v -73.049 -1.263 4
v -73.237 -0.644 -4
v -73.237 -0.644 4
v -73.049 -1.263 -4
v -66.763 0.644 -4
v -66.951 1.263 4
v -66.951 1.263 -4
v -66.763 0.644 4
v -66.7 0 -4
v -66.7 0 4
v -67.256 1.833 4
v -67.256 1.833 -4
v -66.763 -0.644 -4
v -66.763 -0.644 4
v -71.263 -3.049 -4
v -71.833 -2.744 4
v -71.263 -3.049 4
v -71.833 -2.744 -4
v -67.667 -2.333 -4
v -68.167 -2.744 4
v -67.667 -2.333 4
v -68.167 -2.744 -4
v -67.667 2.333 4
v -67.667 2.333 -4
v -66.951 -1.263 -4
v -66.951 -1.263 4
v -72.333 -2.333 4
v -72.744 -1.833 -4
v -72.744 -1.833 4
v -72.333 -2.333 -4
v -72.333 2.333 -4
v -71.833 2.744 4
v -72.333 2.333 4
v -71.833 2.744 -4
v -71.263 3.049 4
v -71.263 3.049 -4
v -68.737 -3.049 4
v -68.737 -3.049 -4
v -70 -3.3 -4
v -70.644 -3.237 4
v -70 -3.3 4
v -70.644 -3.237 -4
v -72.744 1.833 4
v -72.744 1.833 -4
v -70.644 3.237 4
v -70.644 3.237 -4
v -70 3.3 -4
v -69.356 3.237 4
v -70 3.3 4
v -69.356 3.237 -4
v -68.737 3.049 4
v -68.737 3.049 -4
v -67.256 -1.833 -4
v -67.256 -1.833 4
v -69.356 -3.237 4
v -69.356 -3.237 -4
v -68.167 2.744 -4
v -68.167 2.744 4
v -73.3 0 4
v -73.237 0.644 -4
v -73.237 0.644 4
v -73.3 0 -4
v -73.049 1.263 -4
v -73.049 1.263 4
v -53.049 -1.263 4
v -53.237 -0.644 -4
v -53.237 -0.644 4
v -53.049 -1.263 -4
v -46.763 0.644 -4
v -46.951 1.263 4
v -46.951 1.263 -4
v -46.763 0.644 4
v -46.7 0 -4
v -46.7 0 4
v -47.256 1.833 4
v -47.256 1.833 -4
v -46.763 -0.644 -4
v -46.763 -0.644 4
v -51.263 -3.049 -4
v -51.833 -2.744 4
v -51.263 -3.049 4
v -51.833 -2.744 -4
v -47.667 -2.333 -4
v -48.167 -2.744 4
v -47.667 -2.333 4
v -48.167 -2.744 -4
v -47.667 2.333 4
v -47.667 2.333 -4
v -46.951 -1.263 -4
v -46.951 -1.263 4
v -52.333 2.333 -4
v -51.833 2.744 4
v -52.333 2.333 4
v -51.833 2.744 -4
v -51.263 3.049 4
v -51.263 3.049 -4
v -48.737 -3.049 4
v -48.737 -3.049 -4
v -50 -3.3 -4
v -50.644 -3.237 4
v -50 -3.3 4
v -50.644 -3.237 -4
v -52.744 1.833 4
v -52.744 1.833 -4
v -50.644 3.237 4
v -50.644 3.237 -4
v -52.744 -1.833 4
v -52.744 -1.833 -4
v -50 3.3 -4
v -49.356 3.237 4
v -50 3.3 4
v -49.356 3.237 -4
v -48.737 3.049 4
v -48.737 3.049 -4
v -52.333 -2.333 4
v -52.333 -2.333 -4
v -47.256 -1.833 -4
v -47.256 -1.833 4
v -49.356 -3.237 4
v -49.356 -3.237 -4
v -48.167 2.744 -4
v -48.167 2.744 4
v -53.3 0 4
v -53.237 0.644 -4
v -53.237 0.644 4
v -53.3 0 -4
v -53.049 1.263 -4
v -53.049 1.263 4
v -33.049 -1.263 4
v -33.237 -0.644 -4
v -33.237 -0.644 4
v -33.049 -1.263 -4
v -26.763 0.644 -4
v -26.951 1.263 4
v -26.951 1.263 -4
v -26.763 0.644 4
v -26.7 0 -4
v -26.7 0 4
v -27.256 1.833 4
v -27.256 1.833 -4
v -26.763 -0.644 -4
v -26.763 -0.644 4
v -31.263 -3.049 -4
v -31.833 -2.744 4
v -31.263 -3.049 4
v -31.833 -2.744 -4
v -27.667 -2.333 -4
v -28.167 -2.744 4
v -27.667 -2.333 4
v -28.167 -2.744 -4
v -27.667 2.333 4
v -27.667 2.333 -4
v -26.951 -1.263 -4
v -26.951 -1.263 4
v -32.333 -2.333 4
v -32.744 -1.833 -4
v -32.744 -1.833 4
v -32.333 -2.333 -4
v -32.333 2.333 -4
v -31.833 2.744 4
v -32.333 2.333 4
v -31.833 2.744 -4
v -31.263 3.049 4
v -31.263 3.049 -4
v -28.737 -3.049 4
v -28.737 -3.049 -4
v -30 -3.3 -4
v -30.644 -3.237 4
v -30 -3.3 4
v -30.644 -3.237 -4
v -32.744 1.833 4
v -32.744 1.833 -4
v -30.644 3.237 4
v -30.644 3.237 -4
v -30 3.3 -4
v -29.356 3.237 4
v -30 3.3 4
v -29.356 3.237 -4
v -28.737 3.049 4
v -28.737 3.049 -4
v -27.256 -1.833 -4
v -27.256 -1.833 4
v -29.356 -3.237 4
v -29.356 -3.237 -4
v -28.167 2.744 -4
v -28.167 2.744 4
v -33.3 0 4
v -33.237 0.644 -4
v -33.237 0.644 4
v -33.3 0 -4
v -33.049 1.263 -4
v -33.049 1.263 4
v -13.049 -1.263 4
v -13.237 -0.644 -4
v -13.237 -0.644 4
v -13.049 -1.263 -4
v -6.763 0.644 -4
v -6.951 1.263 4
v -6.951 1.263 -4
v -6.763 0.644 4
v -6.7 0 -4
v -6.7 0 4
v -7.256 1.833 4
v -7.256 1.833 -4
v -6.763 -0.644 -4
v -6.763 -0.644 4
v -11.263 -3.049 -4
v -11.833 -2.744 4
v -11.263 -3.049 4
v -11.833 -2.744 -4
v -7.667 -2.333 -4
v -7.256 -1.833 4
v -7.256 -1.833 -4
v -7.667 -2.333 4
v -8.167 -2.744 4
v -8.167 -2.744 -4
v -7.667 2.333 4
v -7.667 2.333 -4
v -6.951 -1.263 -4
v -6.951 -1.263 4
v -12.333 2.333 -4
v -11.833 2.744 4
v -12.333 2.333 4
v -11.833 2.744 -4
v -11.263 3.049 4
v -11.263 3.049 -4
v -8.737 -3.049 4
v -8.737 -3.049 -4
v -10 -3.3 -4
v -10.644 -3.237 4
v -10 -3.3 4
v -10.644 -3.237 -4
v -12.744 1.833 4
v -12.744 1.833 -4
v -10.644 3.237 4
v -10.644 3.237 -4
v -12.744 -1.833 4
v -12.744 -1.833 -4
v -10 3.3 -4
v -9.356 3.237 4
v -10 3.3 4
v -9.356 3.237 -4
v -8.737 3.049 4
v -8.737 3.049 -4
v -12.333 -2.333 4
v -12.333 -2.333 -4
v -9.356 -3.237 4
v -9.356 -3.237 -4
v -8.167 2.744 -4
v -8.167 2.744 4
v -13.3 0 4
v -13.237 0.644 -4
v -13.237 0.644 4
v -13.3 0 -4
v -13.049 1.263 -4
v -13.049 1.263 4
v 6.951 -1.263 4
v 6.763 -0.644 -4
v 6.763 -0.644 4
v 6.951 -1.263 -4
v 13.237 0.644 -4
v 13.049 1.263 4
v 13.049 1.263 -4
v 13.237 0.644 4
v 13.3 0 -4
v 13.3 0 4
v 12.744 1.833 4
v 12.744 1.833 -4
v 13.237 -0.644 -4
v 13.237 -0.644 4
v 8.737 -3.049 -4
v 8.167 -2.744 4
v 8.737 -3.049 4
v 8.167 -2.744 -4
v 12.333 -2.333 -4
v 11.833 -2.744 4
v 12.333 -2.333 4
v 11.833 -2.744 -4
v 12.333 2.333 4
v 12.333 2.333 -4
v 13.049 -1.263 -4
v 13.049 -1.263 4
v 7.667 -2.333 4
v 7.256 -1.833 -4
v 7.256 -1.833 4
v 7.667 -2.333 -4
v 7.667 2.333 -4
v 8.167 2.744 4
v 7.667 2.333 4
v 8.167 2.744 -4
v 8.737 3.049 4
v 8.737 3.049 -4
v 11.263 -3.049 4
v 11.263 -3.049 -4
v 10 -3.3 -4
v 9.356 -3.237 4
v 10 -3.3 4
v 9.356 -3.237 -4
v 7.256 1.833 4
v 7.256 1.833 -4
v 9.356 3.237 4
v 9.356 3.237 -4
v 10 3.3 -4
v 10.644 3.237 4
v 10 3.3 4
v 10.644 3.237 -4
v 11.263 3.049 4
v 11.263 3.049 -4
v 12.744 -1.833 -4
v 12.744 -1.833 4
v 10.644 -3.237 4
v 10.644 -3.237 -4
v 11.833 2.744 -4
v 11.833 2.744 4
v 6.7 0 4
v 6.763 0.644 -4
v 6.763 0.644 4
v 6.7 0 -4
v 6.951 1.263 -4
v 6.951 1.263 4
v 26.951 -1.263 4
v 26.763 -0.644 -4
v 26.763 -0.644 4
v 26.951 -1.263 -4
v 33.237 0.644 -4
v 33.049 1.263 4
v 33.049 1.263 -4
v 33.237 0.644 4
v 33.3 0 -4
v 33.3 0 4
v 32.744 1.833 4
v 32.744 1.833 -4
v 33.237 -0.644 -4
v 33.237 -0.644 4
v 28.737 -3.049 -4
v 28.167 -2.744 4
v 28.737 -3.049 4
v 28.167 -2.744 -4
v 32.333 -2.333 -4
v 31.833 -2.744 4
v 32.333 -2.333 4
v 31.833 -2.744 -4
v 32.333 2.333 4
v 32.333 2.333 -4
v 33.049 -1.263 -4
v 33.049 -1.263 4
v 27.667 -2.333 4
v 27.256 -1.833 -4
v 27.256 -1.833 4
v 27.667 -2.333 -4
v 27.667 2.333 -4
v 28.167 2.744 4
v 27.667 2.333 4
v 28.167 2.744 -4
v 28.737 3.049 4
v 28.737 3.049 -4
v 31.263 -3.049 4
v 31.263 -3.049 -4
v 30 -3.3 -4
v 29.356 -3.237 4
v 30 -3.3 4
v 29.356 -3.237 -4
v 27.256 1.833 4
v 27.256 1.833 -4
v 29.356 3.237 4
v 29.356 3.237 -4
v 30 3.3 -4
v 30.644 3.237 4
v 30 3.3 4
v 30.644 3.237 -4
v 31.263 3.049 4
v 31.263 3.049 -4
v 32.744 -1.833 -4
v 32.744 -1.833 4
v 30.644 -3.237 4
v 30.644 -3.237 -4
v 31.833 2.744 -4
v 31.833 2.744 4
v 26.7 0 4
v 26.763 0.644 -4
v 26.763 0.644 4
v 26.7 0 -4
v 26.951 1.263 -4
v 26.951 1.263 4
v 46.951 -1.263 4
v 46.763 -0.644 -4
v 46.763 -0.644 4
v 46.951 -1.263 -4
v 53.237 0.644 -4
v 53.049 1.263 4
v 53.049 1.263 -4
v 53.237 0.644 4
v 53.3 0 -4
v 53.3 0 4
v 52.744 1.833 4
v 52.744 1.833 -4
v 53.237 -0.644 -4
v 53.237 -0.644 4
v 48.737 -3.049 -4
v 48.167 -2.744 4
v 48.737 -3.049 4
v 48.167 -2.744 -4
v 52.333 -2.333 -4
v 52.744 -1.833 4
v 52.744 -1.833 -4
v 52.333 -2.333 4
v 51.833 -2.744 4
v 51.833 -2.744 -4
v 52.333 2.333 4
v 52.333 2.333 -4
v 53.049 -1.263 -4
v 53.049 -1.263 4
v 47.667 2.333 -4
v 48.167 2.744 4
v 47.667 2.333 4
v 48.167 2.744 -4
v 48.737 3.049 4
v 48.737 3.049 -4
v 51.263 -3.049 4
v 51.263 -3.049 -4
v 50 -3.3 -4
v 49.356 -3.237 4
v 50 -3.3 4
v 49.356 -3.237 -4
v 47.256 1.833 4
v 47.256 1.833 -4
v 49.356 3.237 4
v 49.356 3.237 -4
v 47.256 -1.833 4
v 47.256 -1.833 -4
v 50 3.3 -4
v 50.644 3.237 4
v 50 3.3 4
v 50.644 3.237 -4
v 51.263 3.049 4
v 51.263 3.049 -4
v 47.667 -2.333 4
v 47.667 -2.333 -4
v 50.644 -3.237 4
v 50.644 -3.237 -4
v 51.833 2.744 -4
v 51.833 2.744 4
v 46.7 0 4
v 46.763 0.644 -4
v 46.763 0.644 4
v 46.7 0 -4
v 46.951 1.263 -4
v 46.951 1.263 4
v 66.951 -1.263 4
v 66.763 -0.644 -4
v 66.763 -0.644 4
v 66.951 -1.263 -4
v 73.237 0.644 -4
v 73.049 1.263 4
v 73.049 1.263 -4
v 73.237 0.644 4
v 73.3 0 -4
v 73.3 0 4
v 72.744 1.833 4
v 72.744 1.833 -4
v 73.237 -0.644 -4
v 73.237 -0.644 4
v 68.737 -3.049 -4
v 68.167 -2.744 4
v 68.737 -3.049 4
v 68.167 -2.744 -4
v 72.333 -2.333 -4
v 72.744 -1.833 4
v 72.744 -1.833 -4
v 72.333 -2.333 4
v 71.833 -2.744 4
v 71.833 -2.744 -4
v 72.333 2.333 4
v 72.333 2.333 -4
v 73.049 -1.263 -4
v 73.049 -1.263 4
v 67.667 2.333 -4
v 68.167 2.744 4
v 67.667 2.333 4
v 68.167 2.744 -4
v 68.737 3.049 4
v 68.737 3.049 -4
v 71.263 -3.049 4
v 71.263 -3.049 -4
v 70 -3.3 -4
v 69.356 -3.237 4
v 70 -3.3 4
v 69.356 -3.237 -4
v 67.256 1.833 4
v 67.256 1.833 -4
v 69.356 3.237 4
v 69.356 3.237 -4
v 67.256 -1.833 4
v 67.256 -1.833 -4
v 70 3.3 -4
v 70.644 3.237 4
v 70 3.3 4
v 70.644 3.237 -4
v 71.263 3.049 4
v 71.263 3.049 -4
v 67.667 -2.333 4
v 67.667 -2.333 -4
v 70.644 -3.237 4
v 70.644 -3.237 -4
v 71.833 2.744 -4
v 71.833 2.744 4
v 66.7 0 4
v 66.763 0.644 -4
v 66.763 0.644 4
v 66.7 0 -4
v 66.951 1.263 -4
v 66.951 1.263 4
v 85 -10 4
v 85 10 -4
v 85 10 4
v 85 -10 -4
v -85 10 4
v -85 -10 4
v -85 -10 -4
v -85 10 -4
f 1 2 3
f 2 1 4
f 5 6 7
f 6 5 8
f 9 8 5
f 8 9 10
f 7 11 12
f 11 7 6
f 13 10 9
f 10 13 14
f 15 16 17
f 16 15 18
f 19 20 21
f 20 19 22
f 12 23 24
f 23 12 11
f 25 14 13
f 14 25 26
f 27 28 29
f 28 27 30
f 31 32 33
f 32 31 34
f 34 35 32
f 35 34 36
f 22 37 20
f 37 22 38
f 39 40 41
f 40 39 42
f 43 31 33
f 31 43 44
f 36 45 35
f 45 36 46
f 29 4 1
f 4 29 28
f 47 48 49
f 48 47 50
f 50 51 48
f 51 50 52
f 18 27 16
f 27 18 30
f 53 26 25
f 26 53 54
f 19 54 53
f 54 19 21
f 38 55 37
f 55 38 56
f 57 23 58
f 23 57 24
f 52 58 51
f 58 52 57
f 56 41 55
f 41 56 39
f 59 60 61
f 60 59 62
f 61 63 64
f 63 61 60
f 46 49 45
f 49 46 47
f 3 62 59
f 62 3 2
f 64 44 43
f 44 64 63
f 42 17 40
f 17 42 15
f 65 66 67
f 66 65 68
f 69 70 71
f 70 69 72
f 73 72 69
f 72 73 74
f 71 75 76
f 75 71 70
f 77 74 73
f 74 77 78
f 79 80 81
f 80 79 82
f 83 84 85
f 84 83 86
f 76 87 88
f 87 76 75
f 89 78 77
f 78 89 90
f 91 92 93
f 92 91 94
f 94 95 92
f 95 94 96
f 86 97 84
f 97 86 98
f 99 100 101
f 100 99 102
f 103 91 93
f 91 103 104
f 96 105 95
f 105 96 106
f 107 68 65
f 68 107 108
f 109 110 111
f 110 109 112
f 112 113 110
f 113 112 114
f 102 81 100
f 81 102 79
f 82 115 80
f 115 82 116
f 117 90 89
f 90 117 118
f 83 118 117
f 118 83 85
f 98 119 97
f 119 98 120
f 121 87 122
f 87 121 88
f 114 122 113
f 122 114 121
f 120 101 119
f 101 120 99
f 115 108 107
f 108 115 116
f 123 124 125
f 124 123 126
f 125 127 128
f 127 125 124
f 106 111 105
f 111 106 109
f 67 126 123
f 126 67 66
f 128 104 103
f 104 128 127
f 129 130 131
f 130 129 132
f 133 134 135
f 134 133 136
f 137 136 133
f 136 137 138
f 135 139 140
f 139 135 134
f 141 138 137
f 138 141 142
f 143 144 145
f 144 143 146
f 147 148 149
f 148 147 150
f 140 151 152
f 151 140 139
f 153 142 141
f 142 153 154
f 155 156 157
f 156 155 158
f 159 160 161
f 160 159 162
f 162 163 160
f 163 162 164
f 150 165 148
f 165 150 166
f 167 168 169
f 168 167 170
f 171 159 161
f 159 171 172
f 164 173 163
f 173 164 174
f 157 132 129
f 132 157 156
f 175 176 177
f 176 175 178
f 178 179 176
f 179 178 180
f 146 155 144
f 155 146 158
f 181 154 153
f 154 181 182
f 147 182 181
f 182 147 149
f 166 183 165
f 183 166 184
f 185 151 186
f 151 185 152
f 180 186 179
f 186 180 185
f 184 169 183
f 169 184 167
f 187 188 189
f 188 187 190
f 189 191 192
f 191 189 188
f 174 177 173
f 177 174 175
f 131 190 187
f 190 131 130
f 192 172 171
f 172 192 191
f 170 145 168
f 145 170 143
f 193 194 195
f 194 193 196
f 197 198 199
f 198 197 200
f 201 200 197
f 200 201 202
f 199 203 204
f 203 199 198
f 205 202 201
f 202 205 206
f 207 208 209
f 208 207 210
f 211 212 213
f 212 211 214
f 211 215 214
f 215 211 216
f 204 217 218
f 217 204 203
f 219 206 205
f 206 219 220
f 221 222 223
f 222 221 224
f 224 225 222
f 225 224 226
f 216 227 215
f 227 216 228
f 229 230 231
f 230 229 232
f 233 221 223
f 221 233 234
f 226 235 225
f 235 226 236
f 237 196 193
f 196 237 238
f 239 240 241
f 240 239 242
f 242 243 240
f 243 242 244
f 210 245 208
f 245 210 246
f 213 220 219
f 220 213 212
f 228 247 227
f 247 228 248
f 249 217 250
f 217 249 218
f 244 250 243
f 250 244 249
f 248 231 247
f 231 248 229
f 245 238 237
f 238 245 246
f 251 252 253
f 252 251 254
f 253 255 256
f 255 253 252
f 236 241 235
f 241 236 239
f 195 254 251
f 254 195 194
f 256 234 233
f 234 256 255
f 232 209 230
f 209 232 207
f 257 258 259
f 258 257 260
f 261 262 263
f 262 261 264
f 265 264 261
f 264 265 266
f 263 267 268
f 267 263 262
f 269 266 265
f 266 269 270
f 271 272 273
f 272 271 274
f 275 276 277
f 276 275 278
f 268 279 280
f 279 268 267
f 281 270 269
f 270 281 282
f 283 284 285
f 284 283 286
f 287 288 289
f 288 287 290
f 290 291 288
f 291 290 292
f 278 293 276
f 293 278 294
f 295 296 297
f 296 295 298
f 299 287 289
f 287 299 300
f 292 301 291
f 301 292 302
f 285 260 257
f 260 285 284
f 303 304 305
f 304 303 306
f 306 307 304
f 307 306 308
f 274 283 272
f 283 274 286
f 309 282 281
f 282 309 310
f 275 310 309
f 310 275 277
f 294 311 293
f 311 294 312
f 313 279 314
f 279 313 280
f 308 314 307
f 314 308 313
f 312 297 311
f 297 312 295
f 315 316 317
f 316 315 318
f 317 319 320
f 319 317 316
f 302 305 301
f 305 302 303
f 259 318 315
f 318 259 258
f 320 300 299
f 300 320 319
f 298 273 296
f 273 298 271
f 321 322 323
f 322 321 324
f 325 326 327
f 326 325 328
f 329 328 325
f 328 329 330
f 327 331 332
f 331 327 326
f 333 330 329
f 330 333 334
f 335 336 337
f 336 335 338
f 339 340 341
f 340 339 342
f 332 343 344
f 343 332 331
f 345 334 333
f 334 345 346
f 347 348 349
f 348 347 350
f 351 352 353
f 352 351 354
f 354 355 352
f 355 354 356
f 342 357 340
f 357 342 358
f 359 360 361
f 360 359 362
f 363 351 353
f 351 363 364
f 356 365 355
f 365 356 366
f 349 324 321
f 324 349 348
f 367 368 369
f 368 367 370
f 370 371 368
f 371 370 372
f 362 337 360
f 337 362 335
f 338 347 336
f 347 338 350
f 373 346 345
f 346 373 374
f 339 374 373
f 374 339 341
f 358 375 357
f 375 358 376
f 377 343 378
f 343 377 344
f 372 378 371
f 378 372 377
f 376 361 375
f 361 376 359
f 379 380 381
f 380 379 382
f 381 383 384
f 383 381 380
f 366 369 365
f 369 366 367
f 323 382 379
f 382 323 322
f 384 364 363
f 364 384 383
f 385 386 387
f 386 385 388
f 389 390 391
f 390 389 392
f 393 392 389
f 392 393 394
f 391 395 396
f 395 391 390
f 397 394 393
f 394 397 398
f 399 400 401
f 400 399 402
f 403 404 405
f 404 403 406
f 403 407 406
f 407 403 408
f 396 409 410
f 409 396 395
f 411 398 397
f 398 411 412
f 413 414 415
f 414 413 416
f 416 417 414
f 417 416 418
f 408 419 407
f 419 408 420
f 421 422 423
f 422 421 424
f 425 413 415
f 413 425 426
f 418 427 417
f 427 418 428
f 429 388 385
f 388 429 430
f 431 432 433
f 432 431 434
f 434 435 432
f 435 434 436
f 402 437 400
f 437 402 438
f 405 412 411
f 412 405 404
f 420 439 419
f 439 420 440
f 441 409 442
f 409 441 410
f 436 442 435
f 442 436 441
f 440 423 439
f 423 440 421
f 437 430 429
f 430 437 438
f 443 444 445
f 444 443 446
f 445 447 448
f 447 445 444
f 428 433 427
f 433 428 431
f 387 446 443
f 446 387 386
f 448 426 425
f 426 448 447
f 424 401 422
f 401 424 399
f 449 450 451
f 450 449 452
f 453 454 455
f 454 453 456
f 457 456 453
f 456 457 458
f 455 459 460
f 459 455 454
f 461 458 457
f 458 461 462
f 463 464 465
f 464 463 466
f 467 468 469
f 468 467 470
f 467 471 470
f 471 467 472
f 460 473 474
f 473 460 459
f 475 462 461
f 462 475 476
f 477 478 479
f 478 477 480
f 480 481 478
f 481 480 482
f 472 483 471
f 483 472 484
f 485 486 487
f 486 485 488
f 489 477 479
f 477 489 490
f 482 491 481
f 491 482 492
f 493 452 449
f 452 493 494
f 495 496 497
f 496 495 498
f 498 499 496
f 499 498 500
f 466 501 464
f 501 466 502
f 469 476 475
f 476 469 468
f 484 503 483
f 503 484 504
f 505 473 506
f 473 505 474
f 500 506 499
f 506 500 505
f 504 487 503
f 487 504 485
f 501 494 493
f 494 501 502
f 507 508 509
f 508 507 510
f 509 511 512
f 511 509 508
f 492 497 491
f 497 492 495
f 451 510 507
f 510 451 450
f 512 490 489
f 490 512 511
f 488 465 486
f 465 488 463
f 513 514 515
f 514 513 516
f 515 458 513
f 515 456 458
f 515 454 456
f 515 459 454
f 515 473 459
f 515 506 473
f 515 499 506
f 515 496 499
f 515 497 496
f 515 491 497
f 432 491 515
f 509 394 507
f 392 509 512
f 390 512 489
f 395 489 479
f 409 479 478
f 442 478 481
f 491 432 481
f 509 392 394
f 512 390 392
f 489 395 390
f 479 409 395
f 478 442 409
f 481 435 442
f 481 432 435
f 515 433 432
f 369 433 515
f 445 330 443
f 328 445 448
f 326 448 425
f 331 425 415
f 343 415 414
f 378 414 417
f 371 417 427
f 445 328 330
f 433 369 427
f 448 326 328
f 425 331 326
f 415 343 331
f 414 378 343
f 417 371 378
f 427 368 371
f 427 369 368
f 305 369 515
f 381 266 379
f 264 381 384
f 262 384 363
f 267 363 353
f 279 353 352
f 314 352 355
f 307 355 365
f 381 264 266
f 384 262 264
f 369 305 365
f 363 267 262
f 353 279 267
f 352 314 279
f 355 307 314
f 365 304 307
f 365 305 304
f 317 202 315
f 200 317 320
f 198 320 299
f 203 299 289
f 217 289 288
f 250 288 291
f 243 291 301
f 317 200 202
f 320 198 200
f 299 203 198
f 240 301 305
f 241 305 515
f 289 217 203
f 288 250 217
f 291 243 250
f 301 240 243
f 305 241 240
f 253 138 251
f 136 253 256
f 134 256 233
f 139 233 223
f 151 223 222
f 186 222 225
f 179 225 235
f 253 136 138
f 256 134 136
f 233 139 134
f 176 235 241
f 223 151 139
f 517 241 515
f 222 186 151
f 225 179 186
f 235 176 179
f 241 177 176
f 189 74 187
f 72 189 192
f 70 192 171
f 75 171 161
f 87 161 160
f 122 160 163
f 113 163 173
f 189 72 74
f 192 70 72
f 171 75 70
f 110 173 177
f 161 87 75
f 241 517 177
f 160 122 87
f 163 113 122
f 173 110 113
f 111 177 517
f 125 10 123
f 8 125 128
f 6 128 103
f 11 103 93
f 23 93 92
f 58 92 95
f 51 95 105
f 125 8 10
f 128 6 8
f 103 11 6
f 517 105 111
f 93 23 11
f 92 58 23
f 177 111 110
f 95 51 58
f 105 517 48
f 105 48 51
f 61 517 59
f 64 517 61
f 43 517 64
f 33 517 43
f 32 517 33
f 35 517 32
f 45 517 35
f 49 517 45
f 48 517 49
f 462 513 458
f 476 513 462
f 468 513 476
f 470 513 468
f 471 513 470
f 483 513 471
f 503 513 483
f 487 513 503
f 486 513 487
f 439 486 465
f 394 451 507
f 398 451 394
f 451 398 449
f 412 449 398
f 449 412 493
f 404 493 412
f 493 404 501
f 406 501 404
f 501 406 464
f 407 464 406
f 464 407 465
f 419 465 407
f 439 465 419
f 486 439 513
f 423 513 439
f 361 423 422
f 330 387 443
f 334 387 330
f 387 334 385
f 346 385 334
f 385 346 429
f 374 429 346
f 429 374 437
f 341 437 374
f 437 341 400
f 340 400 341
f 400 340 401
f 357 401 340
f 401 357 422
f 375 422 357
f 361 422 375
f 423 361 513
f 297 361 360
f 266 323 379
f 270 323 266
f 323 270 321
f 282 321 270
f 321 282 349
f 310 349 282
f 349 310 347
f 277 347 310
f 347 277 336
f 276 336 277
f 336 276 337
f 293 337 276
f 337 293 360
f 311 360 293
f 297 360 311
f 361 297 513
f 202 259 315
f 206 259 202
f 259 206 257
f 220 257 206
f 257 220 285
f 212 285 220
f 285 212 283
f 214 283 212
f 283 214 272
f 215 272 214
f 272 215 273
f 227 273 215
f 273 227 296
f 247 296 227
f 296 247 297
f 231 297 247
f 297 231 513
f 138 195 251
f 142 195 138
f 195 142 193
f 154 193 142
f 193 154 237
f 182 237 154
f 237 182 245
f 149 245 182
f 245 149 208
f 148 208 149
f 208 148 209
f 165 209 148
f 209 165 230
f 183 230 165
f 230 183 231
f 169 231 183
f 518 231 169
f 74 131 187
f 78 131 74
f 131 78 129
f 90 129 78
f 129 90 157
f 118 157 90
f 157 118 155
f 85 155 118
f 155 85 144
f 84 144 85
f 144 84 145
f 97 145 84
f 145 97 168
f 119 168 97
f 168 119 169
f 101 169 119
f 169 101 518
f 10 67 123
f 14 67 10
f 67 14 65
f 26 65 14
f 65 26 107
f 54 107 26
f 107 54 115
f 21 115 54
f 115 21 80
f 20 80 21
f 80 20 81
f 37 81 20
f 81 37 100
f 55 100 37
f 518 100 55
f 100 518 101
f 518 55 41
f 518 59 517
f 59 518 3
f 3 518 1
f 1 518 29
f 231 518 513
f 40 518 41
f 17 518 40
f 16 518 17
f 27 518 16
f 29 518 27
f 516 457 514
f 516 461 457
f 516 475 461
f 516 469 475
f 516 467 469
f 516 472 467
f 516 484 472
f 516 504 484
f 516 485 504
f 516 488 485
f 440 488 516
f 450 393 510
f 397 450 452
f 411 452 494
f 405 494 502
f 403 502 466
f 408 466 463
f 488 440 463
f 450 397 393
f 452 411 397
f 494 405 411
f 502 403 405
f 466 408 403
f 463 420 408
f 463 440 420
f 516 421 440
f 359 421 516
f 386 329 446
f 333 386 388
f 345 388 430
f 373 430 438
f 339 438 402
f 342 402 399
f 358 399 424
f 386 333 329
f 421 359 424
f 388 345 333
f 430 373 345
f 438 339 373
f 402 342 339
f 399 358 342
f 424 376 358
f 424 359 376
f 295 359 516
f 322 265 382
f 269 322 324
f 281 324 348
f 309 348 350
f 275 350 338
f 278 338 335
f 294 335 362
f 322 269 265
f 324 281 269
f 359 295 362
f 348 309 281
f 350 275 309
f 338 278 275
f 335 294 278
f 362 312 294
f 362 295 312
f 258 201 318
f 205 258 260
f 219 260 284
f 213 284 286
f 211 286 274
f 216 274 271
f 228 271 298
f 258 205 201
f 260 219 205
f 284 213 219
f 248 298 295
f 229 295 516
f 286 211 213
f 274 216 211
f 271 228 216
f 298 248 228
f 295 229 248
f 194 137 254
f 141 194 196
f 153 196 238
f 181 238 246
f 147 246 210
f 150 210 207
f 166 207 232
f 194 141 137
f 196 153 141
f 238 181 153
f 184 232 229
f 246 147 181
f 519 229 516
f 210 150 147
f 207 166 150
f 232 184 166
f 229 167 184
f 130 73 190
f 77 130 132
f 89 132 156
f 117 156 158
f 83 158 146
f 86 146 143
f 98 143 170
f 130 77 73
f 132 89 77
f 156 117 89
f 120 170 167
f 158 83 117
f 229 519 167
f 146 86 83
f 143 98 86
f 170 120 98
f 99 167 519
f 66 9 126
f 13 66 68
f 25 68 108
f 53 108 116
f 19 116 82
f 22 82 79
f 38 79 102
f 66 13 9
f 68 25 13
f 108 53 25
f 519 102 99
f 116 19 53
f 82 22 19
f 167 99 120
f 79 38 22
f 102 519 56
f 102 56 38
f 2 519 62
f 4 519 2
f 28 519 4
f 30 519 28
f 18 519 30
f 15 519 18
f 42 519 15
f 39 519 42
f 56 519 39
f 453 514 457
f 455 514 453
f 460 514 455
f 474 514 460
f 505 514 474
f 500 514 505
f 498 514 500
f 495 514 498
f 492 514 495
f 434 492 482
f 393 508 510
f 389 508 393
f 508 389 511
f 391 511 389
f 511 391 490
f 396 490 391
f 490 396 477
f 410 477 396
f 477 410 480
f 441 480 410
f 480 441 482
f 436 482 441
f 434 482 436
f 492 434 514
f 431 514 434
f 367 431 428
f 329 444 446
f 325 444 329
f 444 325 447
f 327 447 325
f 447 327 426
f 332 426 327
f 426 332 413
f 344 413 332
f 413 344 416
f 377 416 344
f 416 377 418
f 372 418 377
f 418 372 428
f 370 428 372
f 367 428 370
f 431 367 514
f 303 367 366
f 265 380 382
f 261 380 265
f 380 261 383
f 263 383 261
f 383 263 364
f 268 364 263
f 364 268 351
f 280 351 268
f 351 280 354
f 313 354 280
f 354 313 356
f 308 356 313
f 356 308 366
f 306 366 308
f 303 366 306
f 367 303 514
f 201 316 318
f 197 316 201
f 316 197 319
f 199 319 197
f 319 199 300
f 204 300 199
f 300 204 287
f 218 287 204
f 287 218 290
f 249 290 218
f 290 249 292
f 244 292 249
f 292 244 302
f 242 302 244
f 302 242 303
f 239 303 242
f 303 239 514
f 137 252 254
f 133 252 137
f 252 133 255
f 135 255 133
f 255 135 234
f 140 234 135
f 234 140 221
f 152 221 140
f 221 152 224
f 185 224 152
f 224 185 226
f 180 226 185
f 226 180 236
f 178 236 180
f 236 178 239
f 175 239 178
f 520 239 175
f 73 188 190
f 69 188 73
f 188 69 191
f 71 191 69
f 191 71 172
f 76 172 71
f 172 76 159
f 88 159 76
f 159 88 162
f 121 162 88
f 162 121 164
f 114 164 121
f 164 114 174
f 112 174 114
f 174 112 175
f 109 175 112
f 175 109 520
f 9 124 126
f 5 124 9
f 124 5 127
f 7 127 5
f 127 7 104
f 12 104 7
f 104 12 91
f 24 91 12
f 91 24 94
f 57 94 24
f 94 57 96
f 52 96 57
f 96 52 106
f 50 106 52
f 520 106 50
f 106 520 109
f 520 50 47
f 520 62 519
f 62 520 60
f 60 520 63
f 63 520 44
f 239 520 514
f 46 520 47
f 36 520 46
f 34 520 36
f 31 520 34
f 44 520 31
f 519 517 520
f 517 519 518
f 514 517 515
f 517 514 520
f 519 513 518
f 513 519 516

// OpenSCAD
$fn = 32;

// ----------------------------------------------------------------------
// Hole bar, 8 x Ø6.6
// row layout, 15 mm edge offset
// ----------------------------------------------------------------------

// --- parameters (mm) ---
bar_w = 20;    // bar width (Y)
bar_t = 8;     // bar thickness (Z)
holes = 8;     // holes per row
hole_d = 6.6;  // hole diameter
edge = 15;     // offset from the bar end to the first hole
pitch = 20;    // pitch between neighbouring holes

// --- derived feature positions (mm) ---
span = (holes - 1) * pitch;   // = 140   distance between the end holes
bar_l = span + 2 * edge;      // = 170   overall bar length
start_x = -bar_l / 2 + edge;  // = -70   X of the first hole
feature_centers = [
  [start_x + 0 * pitch, 0],
  [start_x + 1 * pitch, 0],
  [start_x + 2 * pitch, 0],
  [start_x + 3 * pitch, 0],
  [start_x + 4 * pitch, 0],
  [start_x + 5 * pitch, 0],
  [start_x + 6 * pitch, 0],
  [start_x + 7 * pitch, 0]
];   // hole centres of the first row

// bar with one row of holes, drilled from feature_centers
difference() {
  translate([-bar_l / 2, -bar_w / 2, -bar_t / 2]) cube([bar_l, bar_w, bar_t]);
  for (centre = feature_centers)
    translate([centre[0], centre[1], 0])
      cylinder(d = hole_d, h = bar_t + 2, center = true);
}
